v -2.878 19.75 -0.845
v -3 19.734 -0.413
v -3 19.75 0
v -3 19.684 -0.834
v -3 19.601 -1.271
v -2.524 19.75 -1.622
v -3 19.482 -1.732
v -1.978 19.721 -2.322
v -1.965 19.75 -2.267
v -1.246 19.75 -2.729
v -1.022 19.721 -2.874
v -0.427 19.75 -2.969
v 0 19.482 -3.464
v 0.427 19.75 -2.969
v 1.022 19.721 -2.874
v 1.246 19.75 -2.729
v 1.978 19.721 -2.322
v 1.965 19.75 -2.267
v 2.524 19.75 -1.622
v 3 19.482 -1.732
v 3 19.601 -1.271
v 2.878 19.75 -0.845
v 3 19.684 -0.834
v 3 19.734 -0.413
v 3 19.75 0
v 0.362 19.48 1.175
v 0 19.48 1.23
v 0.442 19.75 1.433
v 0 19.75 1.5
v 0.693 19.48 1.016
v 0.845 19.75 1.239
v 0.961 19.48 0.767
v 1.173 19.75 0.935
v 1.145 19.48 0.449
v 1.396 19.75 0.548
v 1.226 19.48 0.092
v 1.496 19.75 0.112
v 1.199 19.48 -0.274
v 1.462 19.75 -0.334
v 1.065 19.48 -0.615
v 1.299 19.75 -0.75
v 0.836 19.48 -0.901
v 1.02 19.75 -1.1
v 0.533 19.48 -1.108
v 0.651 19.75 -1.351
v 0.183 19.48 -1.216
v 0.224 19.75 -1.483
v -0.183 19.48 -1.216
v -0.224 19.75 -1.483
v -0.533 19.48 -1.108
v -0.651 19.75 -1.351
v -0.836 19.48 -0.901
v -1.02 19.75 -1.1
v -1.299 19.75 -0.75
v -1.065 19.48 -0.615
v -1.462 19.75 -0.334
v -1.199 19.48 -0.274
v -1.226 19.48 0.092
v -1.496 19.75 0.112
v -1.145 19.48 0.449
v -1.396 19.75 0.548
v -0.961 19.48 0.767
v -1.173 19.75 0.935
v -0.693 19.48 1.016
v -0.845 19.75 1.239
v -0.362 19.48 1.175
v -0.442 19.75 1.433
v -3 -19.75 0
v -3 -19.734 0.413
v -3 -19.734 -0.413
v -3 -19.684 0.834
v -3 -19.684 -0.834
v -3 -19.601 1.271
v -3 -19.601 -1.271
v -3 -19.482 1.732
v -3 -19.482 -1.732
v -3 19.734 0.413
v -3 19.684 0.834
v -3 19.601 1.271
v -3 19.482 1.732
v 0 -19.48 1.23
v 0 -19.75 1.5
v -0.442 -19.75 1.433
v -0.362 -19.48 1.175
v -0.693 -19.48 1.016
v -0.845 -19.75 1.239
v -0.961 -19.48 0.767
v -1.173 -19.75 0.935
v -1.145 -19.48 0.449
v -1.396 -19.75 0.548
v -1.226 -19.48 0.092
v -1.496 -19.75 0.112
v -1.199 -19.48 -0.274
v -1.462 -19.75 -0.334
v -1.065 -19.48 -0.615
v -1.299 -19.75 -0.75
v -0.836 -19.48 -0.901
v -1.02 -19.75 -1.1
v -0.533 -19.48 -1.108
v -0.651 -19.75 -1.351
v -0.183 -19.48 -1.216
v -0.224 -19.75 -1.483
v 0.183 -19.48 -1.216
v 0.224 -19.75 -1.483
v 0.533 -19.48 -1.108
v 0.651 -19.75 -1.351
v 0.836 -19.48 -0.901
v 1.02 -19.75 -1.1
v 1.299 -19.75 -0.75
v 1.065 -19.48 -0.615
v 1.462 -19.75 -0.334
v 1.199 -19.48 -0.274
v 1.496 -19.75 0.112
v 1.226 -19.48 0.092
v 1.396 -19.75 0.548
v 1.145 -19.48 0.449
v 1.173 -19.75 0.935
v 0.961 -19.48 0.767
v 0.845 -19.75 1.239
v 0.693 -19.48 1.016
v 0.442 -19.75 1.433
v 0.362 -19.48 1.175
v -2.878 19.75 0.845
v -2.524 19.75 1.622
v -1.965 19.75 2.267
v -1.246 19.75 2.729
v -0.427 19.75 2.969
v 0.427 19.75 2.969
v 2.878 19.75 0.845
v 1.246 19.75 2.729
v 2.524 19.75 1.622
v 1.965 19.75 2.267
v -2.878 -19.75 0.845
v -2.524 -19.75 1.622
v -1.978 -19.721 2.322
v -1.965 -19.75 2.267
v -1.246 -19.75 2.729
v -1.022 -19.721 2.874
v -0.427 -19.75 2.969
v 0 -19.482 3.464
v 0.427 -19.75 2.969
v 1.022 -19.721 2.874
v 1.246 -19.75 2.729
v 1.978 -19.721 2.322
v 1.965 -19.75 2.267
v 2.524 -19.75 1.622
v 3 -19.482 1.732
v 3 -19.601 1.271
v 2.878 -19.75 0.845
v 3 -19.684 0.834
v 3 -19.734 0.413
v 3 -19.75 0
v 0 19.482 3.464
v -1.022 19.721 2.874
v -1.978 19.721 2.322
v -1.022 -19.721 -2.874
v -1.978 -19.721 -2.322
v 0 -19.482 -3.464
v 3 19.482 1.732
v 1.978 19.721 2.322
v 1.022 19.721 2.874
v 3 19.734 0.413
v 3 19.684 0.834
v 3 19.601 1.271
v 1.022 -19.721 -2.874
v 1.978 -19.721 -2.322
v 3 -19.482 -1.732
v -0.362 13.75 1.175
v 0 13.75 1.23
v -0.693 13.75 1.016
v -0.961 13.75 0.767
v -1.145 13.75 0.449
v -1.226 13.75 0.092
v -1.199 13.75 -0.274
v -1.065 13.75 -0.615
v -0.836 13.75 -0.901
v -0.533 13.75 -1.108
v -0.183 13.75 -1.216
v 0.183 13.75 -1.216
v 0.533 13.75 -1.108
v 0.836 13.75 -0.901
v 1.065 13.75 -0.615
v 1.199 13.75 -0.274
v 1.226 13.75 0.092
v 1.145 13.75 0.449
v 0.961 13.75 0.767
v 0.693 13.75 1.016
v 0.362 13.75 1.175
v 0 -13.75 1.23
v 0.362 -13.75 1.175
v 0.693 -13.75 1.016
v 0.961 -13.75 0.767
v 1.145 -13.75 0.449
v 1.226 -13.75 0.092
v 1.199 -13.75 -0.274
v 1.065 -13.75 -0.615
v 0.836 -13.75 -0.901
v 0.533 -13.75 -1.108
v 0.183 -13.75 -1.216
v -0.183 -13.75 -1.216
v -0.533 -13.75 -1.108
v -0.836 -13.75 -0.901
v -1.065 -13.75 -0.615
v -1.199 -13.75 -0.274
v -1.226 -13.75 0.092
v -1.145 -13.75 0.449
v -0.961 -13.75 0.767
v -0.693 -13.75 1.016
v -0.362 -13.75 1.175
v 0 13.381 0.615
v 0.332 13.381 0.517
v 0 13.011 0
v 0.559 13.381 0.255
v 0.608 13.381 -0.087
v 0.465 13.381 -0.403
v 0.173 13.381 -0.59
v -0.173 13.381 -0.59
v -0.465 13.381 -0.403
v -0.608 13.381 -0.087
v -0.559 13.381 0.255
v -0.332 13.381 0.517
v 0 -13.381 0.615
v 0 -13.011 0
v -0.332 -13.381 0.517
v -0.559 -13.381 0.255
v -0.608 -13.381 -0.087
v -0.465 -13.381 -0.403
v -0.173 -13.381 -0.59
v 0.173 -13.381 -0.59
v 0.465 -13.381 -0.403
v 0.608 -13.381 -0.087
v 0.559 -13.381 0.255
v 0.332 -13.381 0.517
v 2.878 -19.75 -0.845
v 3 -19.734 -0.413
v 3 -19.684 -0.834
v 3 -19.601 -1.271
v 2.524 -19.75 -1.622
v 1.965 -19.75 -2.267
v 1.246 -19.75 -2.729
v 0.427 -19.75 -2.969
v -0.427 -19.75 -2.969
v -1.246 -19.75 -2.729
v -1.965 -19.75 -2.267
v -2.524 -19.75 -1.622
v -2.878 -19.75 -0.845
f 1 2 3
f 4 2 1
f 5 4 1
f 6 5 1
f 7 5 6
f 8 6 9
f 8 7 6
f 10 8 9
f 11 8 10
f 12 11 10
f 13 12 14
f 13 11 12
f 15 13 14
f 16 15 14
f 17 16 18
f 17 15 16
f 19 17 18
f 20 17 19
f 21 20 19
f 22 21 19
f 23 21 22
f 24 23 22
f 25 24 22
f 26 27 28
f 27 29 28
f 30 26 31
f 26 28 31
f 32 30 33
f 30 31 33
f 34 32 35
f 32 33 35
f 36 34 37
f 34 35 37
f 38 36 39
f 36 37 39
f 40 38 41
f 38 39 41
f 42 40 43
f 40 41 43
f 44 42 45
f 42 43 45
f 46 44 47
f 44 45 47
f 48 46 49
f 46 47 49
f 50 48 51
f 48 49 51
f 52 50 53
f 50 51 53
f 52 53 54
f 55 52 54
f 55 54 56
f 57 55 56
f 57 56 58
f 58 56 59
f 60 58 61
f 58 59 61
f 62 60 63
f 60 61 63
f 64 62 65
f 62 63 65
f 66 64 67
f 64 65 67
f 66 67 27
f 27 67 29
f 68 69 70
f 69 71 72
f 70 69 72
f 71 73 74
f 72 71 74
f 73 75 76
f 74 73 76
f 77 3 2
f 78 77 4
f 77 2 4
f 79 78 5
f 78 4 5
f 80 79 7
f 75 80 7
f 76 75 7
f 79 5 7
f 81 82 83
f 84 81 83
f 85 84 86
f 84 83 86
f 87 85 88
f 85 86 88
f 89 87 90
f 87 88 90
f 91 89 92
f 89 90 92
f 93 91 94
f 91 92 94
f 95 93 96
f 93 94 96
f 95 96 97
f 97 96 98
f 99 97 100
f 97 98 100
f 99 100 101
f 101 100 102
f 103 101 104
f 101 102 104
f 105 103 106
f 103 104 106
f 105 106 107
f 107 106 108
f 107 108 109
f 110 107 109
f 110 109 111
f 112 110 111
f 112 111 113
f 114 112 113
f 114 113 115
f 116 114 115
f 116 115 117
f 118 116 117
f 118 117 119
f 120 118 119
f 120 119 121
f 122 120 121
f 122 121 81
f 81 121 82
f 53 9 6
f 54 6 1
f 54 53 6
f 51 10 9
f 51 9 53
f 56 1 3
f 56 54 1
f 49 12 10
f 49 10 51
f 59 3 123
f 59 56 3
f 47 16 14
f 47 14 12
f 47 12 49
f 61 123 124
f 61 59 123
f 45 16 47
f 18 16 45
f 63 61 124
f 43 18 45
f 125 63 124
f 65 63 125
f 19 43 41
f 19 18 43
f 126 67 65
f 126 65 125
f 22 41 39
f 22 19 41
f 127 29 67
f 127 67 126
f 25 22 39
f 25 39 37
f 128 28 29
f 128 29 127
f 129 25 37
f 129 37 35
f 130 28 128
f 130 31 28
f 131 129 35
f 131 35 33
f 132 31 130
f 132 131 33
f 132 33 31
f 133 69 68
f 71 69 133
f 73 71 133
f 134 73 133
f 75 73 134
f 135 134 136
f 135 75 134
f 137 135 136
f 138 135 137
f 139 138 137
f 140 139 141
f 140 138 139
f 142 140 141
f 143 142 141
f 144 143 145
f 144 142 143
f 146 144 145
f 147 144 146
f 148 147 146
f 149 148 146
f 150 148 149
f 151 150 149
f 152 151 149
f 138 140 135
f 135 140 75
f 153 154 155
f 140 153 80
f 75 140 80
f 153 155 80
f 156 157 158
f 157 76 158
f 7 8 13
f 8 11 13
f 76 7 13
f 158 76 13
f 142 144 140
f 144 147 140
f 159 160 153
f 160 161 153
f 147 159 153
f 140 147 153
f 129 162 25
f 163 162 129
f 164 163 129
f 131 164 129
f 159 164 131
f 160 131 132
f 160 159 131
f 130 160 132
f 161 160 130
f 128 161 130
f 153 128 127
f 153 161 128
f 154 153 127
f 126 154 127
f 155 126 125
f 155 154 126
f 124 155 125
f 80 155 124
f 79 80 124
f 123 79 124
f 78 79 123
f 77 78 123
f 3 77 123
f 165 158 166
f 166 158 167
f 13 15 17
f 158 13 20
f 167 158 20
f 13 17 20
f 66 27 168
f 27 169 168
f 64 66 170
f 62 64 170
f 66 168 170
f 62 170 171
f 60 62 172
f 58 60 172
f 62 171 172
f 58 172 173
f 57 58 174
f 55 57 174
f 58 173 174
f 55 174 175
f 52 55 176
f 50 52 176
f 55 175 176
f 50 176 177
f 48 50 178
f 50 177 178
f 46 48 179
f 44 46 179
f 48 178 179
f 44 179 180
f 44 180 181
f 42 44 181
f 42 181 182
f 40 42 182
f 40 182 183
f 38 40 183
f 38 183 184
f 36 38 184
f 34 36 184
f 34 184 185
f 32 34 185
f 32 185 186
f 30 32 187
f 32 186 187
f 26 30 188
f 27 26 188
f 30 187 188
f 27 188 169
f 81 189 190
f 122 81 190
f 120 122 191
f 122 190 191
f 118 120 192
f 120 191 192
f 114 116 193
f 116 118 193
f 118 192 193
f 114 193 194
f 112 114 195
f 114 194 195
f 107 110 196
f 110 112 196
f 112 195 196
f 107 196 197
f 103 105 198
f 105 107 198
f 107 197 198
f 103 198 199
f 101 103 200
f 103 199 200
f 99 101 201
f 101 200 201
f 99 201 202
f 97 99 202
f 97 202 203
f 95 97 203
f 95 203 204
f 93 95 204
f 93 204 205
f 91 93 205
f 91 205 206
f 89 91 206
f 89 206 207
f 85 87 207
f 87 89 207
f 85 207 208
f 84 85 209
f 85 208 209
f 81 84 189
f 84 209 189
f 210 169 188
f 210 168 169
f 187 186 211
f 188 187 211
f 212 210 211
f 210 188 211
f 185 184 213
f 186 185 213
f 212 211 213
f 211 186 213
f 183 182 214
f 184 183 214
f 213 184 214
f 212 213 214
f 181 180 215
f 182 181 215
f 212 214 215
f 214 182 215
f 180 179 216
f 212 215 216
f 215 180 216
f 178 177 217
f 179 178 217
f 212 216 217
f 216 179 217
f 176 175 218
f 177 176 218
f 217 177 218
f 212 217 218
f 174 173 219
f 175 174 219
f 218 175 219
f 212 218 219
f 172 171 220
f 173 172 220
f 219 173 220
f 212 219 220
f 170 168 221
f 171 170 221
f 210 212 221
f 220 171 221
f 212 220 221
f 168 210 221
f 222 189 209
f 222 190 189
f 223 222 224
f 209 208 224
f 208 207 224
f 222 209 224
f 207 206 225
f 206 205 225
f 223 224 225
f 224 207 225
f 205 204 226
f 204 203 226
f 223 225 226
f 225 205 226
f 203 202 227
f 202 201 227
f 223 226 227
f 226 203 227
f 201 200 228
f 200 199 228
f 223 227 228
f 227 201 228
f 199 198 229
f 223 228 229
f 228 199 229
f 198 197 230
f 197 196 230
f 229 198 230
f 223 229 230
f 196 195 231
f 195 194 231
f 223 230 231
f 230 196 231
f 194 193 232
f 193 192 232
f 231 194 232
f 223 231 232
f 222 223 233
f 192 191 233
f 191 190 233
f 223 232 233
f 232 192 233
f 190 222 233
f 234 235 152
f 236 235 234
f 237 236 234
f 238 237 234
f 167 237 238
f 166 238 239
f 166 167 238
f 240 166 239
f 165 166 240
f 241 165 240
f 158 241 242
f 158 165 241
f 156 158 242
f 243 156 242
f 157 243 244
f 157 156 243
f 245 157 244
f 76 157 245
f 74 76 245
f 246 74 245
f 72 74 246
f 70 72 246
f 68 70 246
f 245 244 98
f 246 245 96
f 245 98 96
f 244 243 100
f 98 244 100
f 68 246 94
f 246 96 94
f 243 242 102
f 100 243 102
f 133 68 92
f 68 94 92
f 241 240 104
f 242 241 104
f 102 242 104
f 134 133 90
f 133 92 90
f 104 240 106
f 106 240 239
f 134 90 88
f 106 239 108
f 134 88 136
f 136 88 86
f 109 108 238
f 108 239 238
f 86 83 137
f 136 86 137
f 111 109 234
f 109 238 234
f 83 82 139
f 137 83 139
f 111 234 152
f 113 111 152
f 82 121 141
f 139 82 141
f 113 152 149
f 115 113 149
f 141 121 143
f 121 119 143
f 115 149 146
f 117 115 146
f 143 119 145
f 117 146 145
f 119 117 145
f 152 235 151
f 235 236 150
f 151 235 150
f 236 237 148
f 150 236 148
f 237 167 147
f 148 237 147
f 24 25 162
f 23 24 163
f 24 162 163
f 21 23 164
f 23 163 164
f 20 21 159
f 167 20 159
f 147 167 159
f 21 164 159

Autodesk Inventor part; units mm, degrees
ref_plane "YZ Plane" through (0, 0, 0) normal (1, 0, 0) x (0, 1, 0)
ref_plane "XZ Plane" through (0, 0, 0) normal (0, 1, 0) x (-1, 0, 0)
ref_plane "XY Plane" through (0, 0, 0) normal (0, 0, 1) x (1, 0, 0)
sketch "スケッチ1" plane through (0, 0, 0) normal (1, 0, 0) x (0, 1, 0)
  line L0 (-19.75, 0) -> (19.75, 0)
  line L1 (0, 0) -> (0, 3.4641) construction
  line L2 (-19.4821, 3.4641) -> (-19.75, 3)
  line L3 (-19.75, 3) -> (-19.75, 0)
  line L4 (-19.4821, 3.4641) -> (19.4821, 3.4641)
  line L5 (19.4821, 3.4641) -> (19.75, 3)
  line L6 (19.75, 3) -> (19.75, 0)
  dimension "d1" = 3
  dimension "d2" = 3.4641
  dimension "d3" = 30
  dimension "d4" = 39.5
revolve "回転1" add sketch "スケッチ1" angle 360 about axis through (0, -19.75, 0) along (0, 1, 0)
sketch "スケッチ2" plane through (0, 19.75, 0) normal (0, 1, 0) x (1, 0, 0)
  circle A0 centre (0, 0) radius 3.4641 projected
  line L0 (0, -3.4641) -> (-3, -1.7321)
  line L1 (-3, -1.7321) -> (-3, 1.7321)
  line L2 (-3, 1.7321) -> (0, 3.4641)
  line L3 (0, 3.4641) -> (3, 1.7321)
  line L4 (3, 1.7321) -> (3, -1.7321)
  line L5 (3, -1.7321) -> (0, -3.4641)
  point P0 (0, 0)
  point P1 (0, 0)
  point P2 (3, -1.7321)
  point P3 (3, -1.7321)
  point P4 (3, 1.7321)
  point P5 (3, 1.7321)
  point P6 (0, 3.4641)
  point P7 (0, 3.4641)
  point P8 (-3, 1.7321)
  point P9 (-3, 1.7321)
  point P10 (-3, -1.7321)
  point P11 (-3, -1.7321)
extrude "押し出し1" cut sketch "スケッチ2" against normal through all contours A0 L4 | L3 A0 | A0 L5 | L2 A0 | A0 L0 | L1 A0
hole "穴1" at (0, 19.75, 0) direction (0, -1, 0) diameter 2.459 depth 6 tip angle 118 countersink diameter 3 countersink angle 90 thread size "M3x0.5" class "6H" standard "ISO Metric profile"
mirror "ミラー1" about plane through (0, 0, 0) normal (0, 1, 0) of "穴1"
equation "\"d2\" = 1.1547 * d1"
properties part number "ABLSBF6-39.5-M3-N3" material "アルミニウム 2014-T4"
